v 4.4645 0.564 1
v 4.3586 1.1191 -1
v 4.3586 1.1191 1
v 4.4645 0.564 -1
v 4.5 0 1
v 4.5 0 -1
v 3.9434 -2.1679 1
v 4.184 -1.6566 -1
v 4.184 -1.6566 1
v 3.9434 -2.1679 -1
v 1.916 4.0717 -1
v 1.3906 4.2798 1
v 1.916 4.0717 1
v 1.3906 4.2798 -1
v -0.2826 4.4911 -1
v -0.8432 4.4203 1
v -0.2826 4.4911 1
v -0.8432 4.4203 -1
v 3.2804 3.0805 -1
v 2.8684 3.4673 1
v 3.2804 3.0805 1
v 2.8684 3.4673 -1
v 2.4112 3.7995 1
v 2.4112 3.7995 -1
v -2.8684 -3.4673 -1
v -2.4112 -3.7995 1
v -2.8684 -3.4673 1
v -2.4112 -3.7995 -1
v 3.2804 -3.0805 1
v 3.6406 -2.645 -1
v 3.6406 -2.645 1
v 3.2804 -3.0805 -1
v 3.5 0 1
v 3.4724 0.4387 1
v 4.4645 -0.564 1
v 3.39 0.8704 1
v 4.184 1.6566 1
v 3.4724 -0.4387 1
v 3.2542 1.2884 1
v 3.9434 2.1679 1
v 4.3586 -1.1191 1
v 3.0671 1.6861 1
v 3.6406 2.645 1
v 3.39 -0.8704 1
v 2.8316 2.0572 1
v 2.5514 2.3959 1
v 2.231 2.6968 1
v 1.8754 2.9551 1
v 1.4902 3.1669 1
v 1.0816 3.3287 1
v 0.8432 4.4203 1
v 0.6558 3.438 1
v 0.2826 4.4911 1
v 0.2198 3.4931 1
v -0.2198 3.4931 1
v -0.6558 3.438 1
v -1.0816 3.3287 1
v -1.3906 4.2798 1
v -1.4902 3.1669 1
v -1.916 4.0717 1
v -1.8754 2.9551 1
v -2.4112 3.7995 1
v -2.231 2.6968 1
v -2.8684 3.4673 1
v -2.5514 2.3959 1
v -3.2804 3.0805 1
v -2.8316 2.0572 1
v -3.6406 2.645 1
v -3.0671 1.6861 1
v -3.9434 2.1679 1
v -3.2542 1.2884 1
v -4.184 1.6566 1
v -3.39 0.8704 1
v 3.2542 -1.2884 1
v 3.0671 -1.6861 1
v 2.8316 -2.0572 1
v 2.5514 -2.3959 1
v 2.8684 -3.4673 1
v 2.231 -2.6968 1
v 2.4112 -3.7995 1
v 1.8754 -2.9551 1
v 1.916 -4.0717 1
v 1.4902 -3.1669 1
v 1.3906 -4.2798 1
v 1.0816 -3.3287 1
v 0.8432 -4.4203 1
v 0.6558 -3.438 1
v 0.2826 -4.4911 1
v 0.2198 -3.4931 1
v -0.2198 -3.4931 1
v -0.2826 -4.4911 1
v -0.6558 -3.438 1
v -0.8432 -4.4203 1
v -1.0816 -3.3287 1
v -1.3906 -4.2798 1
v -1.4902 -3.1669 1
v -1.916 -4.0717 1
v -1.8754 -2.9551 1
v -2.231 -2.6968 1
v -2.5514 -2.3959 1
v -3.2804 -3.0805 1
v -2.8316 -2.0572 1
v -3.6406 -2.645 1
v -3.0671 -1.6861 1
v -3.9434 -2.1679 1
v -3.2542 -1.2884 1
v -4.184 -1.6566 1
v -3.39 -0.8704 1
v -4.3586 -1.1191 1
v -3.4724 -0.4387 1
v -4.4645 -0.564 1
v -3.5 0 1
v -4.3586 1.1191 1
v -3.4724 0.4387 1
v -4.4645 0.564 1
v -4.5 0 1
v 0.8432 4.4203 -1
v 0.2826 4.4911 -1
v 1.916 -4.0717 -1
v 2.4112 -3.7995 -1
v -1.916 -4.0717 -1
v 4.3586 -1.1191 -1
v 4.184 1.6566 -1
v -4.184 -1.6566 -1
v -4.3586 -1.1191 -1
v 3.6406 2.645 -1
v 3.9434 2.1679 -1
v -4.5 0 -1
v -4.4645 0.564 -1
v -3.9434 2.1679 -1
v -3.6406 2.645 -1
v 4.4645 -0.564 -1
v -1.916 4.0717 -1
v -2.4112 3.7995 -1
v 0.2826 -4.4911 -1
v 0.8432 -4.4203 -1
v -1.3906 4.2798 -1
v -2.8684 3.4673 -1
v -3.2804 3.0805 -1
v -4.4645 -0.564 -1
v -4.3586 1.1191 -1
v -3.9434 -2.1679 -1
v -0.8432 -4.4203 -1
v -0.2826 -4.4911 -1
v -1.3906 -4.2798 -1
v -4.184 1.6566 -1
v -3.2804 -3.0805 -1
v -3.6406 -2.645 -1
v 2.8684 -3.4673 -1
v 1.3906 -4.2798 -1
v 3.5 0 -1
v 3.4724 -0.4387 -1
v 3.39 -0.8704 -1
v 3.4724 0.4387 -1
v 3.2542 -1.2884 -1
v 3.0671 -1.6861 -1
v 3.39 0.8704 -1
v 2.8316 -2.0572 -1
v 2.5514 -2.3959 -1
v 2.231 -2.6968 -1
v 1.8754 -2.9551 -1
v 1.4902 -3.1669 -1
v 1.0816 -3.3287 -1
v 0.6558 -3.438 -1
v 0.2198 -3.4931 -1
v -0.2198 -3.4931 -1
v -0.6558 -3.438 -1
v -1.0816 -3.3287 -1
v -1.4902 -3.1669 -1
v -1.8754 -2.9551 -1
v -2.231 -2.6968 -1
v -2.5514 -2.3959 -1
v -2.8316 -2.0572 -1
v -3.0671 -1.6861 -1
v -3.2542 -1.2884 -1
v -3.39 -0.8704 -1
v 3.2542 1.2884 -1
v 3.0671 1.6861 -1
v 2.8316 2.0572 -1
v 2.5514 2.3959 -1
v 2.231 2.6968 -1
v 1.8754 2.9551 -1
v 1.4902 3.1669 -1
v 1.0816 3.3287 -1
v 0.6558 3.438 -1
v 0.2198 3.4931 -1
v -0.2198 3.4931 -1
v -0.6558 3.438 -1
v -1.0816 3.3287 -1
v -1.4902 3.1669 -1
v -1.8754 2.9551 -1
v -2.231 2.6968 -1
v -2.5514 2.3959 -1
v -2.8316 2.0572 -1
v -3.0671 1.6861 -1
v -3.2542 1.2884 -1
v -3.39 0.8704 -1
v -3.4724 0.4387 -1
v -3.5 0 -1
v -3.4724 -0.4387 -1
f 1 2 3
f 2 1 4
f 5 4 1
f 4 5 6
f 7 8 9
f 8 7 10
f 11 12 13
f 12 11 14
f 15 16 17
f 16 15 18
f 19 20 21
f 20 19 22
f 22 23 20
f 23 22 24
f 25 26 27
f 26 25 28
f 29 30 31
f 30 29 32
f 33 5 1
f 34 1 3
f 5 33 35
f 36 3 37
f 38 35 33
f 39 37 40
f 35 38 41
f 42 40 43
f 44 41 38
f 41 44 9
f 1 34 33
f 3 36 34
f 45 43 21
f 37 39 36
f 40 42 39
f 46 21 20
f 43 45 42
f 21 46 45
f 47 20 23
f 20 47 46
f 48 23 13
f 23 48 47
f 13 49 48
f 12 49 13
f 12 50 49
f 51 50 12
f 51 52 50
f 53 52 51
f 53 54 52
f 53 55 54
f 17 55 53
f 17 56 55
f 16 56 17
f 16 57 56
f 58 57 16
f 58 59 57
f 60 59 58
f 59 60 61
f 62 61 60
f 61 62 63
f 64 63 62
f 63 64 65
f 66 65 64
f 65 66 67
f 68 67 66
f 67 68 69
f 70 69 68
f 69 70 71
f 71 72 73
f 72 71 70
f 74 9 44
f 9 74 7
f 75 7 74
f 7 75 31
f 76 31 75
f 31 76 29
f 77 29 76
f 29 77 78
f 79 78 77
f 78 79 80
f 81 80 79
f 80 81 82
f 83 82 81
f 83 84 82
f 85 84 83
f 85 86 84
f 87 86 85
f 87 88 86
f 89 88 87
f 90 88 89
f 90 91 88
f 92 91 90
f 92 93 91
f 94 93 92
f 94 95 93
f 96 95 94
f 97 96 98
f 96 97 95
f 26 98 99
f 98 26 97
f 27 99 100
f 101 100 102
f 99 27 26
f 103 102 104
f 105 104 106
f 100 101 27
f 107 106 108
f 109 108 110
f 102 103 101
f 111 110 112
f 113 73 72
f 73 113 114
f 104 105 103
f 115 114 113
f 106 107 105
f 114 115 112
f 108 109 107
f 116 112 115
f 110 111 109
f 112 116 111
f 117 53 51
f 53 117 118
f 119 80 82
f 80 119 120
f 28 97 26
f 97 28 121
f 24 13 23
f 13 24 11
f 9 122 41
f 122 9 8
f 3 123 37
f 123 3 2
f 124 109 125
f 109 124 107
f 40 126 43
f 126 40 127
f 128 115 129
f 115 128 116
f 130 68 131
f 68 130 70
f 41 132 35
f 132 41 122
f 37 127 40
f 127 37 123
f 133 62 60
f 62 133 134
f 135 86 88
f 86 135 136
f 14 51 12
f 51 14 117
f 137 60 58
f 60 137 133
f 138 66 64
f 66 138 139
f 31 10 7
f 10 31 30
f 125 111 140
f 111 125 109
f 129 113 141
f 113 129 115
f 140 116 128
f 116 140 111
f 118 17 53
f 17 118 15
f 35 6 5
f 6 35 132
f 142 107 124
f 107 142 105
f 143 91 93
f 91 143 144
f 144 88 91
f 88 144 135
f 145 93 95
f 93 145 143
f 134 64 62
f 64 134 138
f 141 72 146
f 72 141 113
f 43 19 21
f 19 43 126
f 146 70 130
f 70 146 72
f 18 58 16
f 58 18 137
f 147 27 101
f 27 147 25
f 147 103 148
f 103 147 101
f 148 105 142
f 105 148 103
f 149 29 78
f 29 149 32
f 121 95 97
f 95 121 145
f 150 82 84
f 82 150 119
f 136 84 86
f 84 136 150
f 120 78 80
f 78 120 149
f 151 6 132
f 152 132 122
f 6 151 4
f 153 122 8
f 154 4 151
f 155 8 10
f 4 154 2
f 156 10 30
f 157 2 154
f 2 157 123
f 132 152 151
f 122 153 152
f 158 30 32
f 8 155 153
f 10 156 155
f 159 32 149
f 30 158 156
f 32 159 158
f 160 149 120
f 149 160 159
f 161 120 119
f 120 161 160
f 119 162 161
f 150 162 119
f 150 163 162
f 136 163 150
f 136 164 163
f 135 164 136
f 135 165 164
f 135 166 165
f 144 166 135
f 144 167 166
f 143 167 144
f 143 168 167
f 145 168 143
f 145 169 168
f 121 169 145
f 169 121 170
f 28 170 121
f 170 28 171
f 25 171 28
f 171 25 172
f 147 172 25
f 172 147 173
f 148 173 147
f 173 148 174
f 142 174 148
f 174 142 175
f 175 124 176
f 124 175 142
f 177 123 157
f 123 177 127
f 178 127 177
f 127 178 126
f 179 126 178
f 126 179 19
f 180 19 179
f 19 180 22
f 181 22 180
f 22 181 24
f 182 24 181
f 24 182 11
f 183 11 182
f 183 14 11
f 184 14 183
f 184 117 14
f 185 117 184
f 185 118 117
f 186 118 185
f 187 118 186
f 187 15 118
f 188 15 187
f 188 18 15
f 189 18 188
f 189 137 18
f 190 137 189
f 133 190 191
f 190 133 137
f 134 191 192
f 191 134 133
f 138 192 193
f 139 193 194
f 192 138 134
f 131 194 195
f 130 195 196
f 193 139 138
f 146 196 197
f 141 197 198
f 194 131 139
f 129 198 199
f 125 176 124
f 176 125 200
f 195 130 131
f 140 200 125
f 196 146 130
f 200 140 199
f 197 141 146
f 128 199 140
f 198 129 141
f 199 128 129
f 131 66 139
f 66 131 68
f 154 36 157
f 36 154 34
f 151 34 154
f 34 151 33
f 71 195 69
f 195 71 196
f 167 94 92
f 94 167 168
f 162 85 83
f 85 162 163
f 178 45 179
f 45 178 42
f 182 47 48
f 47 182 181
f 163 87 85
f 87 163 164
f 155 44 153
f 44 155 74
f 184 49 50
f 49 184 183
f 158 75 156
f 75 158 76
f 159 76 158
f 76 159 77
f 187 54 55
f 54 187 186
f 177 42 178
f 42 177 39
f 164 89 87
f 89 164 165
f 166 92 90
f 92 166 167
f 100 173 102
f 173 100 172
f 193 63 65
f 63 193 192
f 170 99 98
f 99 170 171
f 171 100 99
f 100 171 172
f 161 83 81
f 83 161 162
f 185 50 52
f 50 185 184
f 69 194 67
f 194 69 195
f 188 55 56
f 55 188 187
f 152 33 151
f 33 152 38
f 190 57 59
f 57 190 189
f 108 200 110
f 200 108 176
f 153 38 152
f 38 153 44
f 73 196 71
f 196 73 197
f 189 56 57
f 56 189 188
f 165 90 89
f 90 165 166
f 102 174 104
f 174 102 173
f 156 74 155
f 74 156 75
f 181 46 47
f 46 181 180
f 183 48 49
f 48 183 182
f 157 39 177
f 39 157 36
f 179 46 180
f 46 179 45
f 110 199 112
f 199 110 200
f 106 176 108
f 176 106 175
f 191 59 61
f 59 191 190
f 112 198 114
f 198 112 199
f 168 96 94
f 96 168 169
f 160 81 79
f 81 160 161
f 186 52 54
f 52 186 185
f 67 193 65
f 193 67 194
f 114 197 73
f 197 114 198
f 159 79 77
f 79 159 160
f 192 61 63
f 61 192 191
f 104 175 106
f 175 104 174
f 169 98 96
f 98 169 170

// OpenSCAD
$fn = 50;


difference() {
	union() {
		translate(v = [0, 0, -1.0000000000]) {
			cylinder(h = 2, r = 4.5000000000);
		}
	}
	union() {
		translate(v = [0, 0, -100.0000000000]) {
			cylinder(h = 200, r = 3.5000000000);
		}
	}
}
